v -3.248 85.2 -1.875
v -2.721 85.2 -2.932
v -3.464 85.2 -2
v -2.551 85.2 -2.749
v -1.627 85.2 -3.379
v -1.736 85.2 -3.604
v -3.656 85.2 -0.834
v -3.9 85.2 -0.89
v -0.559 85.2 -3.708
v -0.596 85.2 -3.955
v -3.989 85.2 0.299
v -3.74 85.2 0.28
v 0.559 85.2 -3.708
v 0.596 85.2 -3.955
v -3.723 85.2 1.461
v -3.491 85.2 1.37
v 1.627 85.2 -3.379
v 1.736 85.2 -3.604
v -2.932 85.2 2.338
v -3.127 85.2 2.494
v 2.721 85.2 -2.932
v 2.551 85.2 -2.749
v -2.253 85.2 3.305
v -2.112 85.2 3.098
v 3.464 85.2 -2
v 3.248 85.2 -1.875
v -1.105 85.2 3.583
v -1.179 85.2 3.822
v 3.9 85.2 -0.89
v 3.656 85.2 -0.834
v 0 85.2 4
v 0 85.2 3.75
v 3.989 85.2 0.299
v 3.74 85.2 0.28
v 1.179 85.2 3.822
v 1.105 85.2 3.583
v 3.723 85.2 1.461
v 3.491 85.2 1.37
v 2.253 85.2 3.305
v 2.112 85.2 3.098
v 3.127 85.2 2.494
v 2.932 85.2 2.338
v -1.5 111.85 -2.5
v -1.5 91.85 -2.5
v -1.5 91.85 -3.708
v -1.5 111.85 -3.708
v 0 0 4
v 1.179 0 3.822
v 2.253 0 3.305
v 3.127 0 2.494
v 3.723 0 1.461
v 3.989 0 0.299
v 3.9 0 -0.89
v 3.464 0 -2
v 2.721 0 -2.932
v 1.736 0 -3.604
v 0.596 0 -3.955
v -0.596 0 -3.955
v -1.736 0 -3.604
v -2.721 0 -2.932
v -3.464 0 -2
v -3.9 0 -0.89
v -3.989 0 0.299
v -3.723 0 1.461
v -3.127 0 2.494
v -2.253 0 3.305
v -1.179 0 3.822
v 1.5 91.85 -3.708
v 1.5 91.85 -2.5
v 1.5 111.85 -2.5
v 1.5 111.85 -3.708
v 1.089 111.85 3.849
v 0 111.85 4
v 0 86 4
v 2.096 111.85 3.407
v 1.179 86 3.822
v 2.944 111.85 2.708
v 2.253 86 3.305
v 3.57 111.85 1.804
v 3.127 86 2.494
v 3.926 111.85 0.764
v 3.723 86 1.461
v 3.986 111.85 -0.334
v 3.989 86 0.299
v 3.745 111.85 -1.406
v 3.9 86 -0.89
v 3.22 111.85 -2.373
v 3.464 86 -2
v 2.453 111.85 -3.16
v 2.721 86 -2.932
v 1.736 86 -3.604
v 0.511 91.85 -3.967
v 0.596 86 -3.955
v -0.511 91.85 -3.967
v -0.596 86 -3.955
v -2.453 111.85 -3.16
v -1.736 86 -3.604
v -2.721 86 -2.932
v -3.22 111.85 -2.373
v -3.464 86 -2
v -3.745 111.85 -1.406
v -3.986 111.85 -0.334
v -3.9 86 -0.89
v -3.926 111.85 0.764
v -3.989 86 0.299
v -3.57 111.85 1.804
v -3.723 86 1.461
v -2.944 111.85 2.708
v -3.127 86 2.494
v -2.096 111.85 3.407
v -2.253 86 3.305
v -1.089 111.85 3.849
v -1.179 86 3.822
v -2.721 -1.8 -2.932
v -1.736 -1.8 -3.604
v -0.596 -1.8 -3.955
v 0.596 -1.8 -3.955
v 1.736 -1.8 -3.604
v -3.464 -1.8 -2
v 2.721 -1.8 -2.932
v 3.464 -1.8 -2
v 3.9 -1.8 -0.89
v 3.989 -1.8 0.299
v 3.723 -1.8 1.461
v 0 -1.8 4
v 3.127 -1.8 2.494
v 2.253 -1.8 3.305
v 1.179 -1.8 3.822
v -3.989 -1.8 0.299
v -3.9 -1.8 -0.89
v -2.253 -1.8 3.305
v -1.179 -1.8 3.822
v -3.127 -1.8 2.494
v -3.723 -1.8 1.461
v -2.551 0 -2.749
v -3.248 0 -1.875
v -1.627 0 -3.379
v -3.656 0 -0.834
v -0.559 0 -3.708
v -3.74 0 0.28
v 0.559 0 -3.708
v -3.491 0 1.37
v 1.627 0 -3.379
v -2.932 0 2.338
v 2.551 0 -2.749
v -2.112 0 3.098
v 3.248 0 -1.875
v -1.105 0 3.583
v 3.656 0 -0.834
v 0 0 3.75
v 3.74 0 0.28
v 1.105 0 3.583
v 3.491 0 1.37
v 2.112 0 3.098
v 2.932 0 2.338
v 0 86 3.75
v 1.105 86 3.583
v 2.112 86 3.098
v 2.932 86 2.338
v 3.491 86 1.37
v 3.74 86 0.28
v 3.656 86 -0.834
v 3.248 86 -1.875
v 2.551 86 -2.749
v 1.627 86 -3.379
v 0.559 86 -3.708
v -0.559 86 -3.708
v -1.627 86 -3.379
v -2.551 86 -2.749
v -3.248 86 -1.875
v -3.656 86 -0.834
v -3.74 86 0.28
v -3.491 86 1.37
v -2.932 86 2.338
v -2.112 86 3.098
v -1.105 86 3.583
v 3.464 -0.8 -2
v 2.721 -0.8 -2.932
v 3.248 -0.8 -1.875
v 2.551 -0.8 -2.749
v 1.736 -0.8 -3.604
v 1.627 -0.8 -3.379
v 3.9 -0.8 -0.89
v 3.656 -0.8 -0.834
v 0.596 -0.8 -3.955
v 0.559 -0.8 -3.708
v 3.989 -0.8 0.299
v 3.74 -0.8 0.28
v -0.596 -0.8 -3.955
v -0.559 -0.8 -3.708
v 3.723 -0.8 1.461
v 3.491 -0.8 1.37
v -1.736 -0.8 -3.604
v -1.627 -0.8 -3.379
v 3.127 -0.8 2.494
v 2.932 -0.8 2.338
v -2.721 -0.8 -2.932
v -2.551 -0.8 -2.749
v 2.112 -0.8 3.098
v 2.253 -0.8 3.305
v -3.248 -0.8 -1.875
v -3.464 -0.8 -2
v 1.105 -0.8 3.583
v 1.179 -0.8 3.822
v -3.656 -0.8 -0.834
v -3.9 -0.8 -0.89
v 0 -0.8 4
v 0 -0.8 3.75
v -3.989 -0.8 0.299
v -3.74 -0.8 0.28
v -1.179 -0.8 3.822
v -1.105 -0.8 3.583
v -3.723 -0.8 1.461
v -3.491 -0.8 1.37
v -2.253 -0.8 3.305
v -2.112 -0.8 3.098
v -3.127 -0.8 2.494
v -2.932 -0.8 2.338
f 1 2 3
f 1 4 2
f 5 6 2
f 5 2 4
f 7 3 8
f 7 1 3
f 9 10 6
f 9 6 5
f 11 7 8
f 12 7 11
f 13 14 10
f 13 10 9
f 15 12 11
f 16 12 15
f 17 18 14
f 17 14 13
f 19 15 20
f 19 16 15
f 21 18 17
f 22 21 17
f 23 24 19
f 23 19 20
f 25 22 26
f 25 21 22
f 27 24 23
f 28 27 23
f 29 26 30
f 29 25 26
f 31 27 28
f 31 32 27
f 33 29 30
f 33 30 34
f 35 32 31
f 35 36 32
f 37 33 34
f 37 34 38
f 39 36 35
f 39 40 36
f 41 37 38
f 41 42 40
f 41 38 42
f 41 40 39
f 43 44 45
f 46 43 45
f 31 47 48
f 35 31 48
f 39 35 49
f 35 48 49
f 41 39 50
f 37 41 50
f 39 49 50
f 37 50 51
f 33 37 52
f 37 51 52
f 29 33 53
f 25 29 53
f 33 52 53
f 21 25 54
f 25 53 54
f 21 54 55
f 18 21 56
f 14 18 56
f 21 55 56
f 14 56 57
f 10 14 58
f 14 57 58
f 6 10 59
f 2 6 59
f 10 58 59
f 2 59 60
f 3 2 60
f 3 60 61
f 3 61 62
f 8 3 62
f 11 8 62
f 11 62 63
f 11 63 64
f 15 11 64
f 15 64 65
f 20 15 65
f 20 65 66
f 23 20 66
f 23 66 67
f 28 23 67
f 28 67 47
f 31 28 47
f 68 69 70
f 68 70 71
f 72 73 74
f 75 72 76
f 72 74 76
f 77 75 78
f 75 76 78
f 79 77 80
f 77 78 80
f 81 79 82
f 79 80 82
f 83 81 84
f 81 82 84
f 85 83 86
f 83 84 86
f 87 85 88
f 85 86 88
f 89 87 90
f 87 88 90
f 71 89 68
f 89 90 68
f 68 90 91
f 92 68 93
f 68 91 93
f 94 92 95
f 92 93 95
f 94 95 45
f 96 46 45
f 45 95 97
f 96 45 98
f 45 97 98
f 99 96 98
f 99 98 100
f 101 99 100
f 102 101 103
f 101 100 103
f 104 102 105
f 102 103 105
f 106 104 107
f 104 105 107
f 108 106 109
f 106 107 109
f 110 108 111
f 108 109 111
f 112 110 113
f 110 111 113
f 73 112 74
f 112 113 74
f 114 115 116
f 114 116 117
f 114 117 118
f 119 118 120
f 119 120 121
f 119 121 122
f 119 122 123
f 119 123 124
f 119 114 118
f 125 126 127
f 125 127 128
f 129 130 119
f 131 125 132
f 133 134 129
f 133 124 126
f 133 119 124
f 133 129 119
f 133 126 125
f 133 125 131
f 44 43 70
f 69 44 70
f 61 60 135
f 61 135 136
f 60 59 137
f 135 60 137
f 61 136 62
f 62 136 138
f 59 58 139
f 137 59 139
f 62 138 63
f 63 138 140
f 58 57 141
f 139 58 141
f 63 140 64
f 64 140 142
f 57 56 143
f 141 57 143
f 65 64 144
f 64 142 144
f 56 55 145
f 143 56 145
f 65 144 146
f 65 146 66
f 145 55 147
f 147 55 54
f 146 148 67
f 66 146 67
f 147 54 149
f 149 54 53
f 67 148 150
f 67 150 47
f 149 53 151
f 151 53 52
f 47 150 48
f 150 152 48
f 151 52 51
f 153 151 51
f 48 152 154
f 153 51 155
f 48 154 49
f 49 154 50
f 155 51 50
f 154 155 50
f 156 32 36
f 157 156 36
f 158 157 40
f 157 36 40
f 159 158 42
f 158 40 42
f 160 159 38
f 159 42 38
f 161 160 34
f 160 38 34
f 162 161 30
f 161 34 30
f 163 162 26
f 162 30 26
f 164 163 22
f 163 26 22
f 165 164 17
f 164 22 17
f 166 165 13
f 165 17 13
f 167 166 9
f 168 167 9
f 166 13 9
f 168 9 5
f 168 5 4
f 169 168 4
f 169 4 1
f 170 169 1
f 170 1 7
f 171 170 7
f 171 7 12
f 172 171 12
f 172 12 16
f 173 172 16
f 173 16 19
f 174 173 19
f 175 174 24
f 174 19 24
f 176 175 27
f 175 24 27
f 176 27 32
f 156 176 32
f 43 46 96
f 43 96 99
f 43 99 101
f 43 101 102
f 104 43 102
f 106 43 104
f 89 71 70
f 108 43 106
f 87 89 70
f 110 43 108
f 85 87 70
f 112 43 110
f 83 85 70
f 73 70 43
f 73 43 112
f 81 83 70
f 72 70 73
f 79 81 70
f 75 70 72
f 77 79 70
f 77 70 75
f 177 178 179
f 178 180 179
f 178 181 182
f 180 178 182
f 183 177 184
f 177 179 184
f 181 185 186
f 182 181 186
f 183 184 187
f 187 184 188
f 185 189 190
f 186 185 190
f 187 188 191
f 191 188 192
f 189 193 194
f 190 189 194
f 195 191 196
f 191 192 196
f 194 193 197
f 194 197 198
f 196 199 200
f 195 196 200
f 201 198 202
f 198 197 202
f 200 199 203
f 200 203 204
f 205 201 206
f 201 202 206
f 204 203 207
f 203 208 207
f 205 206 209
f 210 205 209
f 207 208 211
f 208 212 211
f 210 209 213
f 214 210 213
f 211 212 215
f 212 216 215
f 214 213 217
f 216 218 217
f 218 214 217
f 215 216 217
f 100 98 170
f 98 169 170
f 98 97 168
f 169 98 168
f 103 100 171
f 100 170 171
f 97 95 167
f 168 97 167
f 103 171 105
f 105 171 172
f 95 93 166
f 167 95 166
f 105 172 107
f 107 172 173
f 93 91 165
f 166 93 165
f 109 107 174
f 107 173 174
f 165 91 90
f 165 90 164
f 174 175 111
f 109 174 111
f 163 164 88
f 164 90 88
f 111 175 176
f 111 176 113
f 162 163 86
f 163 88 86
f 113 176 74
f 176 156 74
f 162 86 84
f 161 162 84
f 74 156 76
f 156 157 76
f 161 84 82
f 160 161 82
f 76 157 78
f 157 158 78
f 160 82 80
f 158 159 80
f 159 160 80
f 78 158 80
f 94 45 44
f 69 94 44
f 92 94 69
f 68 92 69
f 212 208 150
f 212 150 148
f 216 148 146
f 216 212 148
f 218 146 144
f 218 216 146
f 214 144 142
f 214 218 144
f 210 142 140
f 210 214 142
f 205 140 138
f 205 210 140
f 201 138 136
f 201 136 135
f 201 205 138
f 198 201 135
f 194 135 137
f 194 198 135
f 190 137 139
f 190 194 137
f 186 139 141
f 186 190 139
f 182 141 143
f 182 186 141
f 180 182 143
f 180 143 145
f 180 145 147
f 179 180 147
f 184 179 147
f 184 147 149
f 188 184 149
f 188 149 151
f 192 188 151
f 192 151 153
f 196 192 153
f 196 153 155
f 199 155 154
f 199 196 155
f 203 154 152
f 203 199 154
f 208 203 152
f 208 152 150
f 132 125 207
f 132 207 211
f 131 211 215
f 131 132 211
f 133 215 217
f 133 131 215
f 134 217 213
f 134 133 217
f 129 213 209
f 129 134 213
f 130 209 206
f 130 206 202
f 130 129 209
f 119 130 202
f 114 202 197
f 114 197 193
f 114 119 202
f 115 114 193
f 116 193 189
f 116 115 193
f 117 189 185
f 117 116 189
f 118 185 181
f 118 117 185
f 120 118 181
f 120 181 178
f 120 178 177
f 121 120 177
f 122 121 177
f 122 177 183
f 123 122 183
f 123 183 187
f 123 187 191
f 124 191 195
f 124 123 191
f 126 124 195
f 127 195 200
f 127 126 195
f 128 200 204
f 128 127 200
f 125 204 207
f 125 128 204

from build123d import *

# Parameters (mm, degrees)
SKETCH1_R           = 4
BOSS_EXTRUDE1_DEPTH = 111
CUT_EXTRUDE1_START  = -0.8
SKETCH2_R           = 4
SKETCH2_R_2         = 3.75
CUT_EXTRUDE1_DEPTH  = 0.8
SKETCH4_R           = 4
BOSS_EXTRUDE3_DEPTH = 0.85
BOSS_EXTRUDE4_START = 0.8
SKETCH3_R           = 3.75
BOSS_EXTRUDE4_DEPTH = 0.8
BOSS_EXTRUDE5_START = 1
SKETCH5_R           = 4
BOSS_EXTRUDE5_DEPTH = 1
SKETCH6_W           = 3
SKETCH6_H           = 3
CUT_EXTRUDE2_DEPTH  = 20


with BuildPart() as part:
    # Sketch1 → Boss-Extrude1 (new body)
    with BuildSketch(Plane(origin=(0, 0, 0), x_dir=(1, 0, 0), z_dir=(0, 1, 0))):
        with Locations(Location((0, 0, 0), (0, 0, 270))):
            Circle(SKETCH1_R)
    extrude(amount=BOSS_EXTRUDE1_DEPTH)

    # Sketch2 → Cut-Extrude1 (cut)
    with BuildSketch(Plane(origin=(0, 86, 0), x_dir=(1, 0, 0), z_dir=(0, 1, 0)).offset(CUT_EXTRUDE1_START)):
        with Locations(Location((0, 0, 0), (0, 0, 270))):
            Circle(SKETCH2_R)
        with Locations(Location((0, 0, 0), (0, 0, 270))):
            Circle(SKETCH2_R_2, mode=Mode.SUBTRACT)
    extrude(amount=CUT_EXTRUDE1_DEPTH, mode=Mode.SUBTRACT)

    # Sketch4 → Boss-Extrude3 (add)
    with BuildSketch(Plane(origin=(0, 111, 0), x_dir=(1, 0, 0), z_dir=(0, 1, 0))):
        with Locations(Location((0, 0, 0), (0, 0, 270))):
            Circle(SKETCH4_R)
    extrude(amount=BOSS_EXTRUDE3_DEPTH)

    # Sketch3 → Boss-Extrude4 (add)
    with BuildSketch(Plane(origin=(0, 0, 0), x_dir=(-1, 0, 0), z_dir=(0, -1, 0)).offset(BOSS_EXTRUDE4_START)):
        with Locations(Location((0, 0, 0), (0, 0, 270))):
            Circle(SKETCH3_R)
    extrude(amount=-BOSS_EXTRUDE4_DEPTH)

    # Sketch5 → Boss-Extrude5 (add)
    with BuildSketch(Plane.XZ.offset(0.8).offset(BOSS_EXTRUDE5_START)):
        with Locations(Location((0, 0, 0), (0, 0, 90))):
            Circle(SKETCH5_R)
    extrude(amount=-BOSS_EXTRUDE5_DEPTH)

    # Sketch6 → Cut-Extrude2 (cut)
    with BuildSketch(Plane(origin=(0, 111.85, 0), x_dir=(1, 0, 0), z_dir=(0, 1, 0))):
        with Locations((0, 4)):
            Rectangle(SKETCH6_W, SKETCH6_H)
    extrude(amount=-CUT_EXTRUDE2_DEPTH, mode=Mode.SUBTRACT)


solid = part.part
